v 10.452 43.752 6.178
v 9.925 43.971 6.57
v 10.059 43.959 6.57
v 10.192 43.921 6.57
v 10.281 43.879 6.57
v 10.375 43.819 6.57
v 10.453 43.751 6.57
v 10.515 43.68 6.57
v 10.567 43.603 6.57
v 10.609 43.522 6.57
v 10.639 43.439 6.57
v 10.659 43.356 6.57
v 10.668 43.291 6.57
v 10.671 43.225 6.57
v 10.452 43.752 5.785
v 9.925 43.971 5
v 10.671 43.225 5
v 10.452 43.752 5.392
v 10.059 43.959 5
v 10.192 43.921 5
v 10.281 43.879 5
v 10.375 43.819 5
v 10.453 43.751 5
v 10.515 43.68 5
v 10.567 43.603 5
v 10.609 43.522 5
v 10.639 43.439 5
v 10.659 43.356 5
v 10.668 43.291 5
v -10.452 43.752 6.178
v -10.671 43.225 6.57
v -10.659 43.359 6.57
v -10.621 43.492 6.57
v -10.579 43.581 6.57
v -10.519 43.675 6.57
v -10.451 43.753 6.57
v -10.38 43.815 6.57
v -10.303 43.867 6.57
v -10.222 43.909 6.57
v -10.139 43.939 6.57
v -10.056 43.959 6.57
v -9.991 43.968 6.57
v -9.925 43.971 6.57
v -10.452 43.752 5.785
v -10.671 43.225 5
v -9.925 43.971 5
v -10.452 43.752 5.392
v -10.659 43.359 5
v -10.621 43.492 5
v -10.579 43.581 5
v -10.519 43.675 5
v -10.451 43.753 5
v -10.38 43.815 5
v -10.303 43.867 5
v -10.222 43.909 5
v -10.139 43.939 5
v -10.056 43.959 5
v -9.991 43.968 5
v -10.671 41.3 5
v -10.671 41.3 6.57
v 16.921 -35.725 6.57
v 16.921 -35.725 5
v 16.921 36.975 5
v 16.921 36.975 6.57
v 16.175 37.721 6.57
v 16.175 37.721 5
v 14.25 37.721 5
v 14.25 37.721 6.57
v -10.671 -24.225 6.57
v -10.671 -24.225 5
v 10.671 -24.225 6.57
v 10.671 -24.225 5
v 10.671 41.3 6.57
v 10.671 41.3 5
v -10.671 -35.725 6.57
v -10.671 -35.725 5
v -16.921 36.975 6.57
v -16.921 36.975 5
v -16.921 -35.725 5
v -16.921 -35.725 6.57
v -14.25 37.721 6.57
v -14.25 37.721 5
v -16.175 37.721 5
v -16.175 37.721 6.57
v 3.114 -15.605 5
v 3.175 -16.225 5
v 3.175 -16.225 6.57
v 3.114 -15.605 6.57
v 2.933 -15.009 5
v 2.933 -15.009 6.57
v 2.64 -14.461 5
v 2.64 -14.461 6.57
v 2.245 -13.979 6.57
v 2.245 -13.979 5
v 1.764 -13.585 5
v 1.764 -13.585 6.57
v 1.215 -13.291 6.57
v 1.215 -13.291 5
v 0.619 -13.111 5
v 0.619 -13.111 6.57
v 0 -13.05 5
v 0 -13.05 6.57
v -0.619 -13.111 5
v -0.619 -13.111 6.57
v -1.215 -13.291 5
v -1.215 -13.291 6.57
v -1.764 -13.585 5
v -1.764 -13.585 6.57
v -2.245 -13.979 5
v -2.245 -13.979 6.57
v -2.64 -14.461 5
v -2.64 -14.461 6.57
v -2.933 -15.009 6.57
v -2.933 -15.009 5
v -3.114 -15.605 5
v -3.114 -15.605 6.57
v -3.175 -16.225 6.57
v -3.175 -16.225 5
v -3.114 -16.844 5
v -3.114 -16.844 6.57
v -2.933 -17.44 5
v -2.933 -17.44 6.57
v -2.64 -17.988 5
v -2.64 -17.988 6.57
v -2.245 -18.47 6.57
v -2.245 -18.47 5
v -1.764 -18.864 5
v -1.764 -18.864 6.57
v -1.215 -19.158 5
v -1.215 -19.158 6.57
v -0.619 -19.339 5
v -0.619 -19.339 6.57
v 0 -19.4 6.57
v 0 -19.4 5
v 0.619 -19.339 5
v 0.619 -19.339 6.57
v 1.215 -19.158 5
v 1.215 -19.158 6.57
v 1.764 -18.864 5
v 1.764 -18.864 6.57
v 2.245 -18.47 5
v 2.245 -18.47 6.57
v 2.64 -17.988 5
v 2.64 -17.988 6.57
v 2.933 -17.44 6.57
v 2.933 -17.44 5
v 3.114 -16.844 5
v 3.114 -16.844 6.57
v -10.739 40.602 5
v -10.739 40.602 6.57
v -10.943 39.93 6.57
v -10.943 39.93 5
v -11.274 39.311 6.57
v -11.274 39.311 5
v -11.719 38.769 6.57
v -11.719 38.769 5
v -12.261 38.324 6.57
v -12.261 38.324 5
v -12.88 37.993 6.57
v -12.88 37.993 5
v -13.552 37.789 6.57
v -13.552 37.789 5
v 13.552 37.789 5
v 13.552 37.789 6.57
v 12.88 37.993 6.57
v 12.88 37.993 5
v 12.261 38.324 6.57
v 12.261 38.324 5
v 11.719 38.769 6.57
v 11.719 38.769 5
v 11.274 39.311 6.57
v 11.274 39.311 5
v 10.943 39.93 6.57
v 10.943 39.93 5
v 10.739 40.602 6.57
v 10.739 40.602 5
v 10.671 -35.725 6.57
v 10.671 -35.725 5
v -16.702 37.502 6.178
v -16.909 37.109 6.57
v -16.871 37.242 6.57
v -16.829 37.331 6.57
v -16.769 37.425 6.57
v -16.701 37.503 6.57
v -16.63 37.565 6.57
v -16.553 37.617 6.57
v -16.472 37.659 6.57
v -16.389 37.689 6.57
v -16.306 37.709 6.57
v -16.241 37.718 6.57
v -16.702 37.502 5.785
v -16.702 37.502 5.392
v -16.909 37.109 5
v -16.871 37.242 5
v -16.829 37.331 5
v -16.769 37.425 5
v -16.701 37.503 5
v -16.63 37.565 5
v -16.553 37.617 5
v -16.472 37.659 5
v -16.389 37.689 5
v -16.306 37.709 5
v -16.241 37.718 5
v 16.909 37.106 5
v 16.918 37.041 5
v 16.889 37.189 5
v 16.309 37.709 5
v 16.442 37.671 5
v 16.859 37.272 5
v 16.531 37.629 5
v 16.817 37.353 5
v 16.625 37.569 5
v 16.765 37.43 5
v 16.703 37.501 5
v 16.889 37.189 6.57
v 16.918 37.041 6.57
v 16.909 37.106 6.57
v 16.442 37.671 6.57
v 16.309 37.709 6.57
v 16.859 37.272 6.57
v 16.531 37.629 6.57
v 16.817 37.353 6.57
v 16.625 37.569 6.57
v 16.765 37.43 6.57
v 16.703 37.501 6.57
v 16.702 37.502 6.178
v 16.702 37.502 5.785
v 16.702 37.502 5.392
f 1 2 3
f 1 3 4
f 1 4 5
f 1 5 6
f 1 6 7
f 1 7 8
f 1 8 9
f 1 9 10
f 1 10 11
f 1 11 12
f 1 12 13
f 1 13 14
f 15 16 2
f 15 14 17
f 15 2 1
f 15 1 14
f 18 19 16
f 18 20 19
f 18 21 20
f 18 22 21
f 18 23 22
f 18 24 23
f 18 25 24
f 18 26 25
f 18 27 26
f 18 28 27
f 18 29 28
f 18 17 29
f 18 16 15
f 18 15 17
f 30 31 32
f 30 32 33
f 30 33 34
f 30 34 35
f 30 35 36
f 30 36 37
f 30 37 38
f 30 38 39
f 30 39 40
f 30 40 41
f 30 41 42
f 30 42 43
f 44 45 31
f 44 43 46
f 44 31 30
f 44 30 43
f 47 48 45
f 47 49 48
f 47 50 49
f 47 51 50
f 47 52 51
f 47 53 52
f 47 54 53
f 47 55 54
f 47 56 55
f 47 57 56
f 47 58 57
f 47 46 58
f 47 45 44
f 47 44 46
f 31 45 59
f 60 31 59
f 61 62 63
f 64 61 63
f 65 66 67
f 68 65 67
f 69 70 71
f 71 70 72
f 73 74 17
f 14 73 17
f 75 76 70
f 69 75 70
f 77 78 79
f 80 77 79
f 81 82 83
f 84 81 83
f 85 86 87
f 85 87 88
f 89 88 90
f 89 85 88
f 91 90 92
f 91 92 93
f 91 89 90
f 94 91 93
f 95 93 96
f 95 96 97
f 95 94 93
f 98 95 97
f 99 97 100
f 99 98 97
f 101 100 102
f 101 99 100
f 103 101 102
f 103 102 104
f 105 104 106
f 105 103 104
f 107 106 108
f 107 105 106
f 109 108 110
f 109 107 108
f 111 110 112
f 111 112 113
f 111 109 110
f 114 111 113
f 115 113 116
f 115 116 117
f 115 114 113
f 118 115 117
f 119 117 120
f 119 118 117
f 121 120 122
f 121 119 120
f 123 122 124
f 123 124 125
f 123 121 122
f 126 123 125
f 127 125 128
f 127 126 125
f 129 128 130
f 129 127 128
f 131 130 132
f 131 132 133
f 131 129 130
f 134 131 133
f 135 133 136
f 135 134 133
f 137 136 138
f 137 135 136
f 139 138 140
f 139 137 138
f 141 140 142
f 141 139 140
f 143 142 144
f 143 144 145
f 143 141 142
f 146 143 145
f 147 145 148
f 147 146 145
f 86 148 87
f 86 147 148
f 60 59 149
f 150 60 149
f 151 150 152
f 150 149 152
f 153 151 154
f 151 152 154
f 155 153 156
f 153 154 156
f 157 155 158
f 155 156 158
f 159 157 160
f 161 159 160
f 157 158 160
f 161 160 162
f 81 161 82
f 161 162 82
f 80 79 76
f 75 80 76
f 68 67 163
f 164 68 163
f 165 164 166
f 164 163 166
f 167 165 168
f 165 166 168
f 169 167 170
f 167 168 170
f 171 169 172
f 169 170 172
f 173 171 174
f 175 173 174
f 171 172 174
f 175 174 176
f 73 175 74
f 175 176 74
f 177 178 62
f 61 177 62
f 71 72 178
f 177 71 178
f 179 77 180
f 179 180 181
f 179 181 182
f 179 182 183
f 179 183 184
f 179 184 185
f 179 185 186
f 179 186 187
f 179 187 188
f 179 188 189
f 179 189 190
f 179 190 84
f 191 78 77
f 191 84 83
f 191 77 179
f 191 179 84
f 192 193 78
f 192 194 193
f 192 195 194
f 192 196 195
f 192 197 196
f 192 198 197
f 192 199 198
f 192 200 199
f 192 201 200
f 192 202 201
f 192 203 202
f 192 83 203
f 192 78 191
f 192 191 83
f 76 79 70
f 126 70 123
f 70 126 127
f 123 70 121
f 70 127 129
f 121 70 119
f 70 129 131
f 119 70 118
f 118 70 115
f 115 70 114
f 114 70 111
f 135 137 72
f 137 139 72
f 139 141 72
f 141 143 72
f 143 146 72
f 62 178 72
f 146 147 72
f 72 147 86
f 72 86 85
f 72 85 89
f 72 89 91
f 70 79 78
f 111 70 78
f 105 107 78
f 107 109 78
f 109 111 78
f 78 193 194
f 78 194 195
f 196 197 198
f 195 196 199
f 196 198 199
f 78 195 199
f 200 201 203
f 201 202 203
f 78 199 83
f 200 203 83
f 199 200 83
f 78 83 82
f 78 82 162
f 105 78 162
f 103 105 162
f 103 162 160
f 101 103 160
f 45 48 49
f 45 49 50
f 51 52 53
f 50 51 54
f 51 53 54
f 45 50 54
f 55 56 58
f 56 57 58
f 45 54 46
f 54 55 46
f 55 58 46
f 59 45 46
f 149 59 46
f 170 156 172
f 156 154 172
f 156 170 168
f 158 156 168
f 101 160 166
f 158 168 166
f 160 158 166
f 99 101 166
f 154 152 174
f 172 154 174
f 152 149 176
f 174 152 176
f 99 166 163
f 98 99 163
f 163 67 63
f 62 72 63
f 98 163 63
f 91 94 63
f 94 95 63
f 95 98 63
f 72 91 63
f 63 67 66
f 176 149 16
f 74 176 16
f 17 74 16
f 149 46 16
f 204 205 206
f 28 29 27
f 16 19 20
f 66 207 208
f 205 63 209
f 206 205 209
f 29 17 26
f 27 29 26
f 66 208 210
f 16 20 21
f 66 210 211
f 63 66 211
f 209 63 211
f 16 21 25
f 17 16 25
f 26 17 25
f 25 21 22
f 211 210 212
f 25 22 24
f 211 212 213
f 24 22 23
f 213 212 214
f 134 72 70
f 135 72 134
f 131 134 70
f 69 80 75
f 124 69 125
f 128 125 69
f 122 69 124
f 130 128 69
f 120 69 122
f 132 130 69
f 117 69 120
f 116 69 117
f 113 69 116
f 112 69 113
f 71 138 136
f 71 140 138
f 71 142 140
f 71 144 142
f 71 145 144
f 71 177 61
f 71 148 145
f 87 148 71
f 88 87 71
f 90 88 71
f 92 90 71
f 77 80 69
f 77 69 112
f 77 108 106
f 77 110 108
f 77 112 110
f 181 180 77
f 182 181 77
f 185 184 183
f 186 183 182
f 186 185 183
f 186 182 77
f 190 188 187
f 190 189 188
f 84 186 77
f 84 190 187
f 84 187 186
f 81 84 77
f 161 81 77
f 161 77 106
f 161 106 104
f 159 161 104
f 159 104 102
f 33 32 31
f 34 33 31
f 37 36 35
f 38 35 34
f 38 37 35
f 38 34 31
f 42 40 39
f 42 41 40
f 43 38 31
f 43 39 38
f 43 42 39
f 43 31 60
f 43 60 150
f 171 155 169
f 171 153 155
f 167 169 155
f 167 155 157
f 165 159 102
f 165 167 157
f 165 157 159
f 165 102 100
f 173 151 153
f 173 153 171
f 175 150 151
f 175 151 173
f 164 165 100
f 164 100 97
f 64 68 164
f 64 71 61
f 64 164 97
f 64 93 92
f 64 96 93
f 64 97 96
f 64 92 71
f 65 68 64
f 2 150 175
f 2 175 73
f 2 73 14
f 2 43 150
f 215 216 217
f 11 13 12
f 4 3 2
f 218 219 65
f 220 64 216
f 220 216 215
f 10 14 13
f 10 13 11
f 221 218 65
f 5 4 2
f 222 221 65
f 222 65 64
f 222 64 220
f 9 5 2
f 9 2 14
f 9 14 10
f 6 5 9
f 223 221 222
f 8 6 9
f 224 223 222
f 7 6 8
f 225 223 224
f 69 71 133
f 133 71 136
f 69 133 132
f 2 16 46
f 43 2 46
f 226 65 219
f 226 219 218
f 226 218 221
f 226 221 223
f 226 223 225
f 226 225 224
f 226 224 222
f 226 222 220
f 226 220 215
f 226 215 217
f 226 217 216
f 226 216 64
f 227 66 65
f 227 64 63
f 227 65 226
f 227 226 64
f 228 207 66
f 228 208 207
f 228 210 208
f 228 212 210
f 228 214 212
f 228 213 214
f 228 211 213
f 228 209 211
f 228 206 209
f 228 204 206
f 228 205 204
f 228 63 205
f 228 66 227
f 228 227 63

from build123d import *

# Parameters (mm, degrees)
SKETCH2_R           = 3.175
BOSS_EXTRUDE1_DEPTH = 1.57


with BuildPart() as part:
    # Sketch2 → Boss-Extrude1 (new body)
    with BuildSketch(Plane.XY.offset(5)):
        with BuildLine():
            Line((-16.920508995, 36.97485167), (-16.920508995, -35.724508995))
            Line((-16.920508995, -35.724508995), (-10.670508995, -35.724508995))
            Line((-10.670508995, -35.724508995), (-10.670508995, -24.224508995))
            Line((-10.670508995, -24.224508995), (10.670508995, -24.224508995))
            Line((10.670508995, -24.224508995), (10.670508995, -35.724508995))
            Line((10.670508995, -35.724508995), (16.920508995, -35.724508995))
            Line((16.920508995, -35.724508995), (16.920508995, 36.97485167))
            add(Edge.make_bspline(
                [(16.17485167, 37.720508995), (16.268017422, 37.720508995), (16.450238191, 37.688464247), (16.71855323, 37.51855323), (16.888464247, 37.250238191), (16.920508995, 37.068017422), (16.920508995, 36.97485167)],
                knots=[0, 0, 0, 0, 0.25, 0.5, 0.75, 1, 1, 1, 1], degree=3))
            Line((16.17485167, 37.720508995), (14.25, 37.720508995))
            ThreePointArc((14.25, 37.720508995), (11.718917637, 38.768917637), (10.670508995, 41.3))
            Line((10.670508995, 41.3), (10.670508995, 43.22485167))
            add(Edge.make_bspline(
                [(9.92485167, 43.970508995), (10.018017422, 43.970508995), (10.200238191, 43.938464247), (10.46855323, 43.76855323), (10.638464247, 43.500238191), (10.670508995, 43.318017422), (10.670508995, 43.22485167)],
                knots=[0, 0, 0, 0, 0.25, 0.5, 0.75, 1, 1, 1, 1], degree=3))
            Line((9.92485167, 43.970508995), (-9.92485167, 43.970508995))
            add(Edge.make_bspline(
                [(-10.670508995, 43.22485167), (-10.670508995, 43.318017422), (-10.638464247, 43.500238191), (-10.46855323, 43.76855323), (-10.200238191, 43.938464247), (-10.018017422, 43.970508995), (-9.92485167, 43.970508995)],
                knots=[0, 0, 0, 0, 0.25, 0.5, 0.75, 1, 1, 1, 1], degree=3))
            Line((-10.670508995, 43.22485167), (-10.670508995, 41.3))
            ThreePointArc((-10.670508995, 41.3), (-11.718917637, 38.768917637), (-14.25, 37.720508995))
            Line((-14.25, 37.720508995), (-16.17485167, 37.720508995))
            add(Edge.make_bspline(
                [(-16.920508995, 36.97485167), (-16.920508995, 37.068017422), (-16.888464247, 37.250238191), (-16.71855323, 37.51855323), (-16.450238191, 37.688464247), (-16.268017422, 37.720508995), (-16.17485167, 37.720508995)],
                knots=[0, 0, 0, 0, 0.25, 0.5, 0.75, 1, 1, 1, 1], degree=3))
        make_face()
        with Locations((0, -16.224508995)):
            Circle(SKETCH2_R, mode=Mode.SUBTRACT)
    extrude(amount=BOSS_EXTRUDE1_DEPTH)


solid = part.part
